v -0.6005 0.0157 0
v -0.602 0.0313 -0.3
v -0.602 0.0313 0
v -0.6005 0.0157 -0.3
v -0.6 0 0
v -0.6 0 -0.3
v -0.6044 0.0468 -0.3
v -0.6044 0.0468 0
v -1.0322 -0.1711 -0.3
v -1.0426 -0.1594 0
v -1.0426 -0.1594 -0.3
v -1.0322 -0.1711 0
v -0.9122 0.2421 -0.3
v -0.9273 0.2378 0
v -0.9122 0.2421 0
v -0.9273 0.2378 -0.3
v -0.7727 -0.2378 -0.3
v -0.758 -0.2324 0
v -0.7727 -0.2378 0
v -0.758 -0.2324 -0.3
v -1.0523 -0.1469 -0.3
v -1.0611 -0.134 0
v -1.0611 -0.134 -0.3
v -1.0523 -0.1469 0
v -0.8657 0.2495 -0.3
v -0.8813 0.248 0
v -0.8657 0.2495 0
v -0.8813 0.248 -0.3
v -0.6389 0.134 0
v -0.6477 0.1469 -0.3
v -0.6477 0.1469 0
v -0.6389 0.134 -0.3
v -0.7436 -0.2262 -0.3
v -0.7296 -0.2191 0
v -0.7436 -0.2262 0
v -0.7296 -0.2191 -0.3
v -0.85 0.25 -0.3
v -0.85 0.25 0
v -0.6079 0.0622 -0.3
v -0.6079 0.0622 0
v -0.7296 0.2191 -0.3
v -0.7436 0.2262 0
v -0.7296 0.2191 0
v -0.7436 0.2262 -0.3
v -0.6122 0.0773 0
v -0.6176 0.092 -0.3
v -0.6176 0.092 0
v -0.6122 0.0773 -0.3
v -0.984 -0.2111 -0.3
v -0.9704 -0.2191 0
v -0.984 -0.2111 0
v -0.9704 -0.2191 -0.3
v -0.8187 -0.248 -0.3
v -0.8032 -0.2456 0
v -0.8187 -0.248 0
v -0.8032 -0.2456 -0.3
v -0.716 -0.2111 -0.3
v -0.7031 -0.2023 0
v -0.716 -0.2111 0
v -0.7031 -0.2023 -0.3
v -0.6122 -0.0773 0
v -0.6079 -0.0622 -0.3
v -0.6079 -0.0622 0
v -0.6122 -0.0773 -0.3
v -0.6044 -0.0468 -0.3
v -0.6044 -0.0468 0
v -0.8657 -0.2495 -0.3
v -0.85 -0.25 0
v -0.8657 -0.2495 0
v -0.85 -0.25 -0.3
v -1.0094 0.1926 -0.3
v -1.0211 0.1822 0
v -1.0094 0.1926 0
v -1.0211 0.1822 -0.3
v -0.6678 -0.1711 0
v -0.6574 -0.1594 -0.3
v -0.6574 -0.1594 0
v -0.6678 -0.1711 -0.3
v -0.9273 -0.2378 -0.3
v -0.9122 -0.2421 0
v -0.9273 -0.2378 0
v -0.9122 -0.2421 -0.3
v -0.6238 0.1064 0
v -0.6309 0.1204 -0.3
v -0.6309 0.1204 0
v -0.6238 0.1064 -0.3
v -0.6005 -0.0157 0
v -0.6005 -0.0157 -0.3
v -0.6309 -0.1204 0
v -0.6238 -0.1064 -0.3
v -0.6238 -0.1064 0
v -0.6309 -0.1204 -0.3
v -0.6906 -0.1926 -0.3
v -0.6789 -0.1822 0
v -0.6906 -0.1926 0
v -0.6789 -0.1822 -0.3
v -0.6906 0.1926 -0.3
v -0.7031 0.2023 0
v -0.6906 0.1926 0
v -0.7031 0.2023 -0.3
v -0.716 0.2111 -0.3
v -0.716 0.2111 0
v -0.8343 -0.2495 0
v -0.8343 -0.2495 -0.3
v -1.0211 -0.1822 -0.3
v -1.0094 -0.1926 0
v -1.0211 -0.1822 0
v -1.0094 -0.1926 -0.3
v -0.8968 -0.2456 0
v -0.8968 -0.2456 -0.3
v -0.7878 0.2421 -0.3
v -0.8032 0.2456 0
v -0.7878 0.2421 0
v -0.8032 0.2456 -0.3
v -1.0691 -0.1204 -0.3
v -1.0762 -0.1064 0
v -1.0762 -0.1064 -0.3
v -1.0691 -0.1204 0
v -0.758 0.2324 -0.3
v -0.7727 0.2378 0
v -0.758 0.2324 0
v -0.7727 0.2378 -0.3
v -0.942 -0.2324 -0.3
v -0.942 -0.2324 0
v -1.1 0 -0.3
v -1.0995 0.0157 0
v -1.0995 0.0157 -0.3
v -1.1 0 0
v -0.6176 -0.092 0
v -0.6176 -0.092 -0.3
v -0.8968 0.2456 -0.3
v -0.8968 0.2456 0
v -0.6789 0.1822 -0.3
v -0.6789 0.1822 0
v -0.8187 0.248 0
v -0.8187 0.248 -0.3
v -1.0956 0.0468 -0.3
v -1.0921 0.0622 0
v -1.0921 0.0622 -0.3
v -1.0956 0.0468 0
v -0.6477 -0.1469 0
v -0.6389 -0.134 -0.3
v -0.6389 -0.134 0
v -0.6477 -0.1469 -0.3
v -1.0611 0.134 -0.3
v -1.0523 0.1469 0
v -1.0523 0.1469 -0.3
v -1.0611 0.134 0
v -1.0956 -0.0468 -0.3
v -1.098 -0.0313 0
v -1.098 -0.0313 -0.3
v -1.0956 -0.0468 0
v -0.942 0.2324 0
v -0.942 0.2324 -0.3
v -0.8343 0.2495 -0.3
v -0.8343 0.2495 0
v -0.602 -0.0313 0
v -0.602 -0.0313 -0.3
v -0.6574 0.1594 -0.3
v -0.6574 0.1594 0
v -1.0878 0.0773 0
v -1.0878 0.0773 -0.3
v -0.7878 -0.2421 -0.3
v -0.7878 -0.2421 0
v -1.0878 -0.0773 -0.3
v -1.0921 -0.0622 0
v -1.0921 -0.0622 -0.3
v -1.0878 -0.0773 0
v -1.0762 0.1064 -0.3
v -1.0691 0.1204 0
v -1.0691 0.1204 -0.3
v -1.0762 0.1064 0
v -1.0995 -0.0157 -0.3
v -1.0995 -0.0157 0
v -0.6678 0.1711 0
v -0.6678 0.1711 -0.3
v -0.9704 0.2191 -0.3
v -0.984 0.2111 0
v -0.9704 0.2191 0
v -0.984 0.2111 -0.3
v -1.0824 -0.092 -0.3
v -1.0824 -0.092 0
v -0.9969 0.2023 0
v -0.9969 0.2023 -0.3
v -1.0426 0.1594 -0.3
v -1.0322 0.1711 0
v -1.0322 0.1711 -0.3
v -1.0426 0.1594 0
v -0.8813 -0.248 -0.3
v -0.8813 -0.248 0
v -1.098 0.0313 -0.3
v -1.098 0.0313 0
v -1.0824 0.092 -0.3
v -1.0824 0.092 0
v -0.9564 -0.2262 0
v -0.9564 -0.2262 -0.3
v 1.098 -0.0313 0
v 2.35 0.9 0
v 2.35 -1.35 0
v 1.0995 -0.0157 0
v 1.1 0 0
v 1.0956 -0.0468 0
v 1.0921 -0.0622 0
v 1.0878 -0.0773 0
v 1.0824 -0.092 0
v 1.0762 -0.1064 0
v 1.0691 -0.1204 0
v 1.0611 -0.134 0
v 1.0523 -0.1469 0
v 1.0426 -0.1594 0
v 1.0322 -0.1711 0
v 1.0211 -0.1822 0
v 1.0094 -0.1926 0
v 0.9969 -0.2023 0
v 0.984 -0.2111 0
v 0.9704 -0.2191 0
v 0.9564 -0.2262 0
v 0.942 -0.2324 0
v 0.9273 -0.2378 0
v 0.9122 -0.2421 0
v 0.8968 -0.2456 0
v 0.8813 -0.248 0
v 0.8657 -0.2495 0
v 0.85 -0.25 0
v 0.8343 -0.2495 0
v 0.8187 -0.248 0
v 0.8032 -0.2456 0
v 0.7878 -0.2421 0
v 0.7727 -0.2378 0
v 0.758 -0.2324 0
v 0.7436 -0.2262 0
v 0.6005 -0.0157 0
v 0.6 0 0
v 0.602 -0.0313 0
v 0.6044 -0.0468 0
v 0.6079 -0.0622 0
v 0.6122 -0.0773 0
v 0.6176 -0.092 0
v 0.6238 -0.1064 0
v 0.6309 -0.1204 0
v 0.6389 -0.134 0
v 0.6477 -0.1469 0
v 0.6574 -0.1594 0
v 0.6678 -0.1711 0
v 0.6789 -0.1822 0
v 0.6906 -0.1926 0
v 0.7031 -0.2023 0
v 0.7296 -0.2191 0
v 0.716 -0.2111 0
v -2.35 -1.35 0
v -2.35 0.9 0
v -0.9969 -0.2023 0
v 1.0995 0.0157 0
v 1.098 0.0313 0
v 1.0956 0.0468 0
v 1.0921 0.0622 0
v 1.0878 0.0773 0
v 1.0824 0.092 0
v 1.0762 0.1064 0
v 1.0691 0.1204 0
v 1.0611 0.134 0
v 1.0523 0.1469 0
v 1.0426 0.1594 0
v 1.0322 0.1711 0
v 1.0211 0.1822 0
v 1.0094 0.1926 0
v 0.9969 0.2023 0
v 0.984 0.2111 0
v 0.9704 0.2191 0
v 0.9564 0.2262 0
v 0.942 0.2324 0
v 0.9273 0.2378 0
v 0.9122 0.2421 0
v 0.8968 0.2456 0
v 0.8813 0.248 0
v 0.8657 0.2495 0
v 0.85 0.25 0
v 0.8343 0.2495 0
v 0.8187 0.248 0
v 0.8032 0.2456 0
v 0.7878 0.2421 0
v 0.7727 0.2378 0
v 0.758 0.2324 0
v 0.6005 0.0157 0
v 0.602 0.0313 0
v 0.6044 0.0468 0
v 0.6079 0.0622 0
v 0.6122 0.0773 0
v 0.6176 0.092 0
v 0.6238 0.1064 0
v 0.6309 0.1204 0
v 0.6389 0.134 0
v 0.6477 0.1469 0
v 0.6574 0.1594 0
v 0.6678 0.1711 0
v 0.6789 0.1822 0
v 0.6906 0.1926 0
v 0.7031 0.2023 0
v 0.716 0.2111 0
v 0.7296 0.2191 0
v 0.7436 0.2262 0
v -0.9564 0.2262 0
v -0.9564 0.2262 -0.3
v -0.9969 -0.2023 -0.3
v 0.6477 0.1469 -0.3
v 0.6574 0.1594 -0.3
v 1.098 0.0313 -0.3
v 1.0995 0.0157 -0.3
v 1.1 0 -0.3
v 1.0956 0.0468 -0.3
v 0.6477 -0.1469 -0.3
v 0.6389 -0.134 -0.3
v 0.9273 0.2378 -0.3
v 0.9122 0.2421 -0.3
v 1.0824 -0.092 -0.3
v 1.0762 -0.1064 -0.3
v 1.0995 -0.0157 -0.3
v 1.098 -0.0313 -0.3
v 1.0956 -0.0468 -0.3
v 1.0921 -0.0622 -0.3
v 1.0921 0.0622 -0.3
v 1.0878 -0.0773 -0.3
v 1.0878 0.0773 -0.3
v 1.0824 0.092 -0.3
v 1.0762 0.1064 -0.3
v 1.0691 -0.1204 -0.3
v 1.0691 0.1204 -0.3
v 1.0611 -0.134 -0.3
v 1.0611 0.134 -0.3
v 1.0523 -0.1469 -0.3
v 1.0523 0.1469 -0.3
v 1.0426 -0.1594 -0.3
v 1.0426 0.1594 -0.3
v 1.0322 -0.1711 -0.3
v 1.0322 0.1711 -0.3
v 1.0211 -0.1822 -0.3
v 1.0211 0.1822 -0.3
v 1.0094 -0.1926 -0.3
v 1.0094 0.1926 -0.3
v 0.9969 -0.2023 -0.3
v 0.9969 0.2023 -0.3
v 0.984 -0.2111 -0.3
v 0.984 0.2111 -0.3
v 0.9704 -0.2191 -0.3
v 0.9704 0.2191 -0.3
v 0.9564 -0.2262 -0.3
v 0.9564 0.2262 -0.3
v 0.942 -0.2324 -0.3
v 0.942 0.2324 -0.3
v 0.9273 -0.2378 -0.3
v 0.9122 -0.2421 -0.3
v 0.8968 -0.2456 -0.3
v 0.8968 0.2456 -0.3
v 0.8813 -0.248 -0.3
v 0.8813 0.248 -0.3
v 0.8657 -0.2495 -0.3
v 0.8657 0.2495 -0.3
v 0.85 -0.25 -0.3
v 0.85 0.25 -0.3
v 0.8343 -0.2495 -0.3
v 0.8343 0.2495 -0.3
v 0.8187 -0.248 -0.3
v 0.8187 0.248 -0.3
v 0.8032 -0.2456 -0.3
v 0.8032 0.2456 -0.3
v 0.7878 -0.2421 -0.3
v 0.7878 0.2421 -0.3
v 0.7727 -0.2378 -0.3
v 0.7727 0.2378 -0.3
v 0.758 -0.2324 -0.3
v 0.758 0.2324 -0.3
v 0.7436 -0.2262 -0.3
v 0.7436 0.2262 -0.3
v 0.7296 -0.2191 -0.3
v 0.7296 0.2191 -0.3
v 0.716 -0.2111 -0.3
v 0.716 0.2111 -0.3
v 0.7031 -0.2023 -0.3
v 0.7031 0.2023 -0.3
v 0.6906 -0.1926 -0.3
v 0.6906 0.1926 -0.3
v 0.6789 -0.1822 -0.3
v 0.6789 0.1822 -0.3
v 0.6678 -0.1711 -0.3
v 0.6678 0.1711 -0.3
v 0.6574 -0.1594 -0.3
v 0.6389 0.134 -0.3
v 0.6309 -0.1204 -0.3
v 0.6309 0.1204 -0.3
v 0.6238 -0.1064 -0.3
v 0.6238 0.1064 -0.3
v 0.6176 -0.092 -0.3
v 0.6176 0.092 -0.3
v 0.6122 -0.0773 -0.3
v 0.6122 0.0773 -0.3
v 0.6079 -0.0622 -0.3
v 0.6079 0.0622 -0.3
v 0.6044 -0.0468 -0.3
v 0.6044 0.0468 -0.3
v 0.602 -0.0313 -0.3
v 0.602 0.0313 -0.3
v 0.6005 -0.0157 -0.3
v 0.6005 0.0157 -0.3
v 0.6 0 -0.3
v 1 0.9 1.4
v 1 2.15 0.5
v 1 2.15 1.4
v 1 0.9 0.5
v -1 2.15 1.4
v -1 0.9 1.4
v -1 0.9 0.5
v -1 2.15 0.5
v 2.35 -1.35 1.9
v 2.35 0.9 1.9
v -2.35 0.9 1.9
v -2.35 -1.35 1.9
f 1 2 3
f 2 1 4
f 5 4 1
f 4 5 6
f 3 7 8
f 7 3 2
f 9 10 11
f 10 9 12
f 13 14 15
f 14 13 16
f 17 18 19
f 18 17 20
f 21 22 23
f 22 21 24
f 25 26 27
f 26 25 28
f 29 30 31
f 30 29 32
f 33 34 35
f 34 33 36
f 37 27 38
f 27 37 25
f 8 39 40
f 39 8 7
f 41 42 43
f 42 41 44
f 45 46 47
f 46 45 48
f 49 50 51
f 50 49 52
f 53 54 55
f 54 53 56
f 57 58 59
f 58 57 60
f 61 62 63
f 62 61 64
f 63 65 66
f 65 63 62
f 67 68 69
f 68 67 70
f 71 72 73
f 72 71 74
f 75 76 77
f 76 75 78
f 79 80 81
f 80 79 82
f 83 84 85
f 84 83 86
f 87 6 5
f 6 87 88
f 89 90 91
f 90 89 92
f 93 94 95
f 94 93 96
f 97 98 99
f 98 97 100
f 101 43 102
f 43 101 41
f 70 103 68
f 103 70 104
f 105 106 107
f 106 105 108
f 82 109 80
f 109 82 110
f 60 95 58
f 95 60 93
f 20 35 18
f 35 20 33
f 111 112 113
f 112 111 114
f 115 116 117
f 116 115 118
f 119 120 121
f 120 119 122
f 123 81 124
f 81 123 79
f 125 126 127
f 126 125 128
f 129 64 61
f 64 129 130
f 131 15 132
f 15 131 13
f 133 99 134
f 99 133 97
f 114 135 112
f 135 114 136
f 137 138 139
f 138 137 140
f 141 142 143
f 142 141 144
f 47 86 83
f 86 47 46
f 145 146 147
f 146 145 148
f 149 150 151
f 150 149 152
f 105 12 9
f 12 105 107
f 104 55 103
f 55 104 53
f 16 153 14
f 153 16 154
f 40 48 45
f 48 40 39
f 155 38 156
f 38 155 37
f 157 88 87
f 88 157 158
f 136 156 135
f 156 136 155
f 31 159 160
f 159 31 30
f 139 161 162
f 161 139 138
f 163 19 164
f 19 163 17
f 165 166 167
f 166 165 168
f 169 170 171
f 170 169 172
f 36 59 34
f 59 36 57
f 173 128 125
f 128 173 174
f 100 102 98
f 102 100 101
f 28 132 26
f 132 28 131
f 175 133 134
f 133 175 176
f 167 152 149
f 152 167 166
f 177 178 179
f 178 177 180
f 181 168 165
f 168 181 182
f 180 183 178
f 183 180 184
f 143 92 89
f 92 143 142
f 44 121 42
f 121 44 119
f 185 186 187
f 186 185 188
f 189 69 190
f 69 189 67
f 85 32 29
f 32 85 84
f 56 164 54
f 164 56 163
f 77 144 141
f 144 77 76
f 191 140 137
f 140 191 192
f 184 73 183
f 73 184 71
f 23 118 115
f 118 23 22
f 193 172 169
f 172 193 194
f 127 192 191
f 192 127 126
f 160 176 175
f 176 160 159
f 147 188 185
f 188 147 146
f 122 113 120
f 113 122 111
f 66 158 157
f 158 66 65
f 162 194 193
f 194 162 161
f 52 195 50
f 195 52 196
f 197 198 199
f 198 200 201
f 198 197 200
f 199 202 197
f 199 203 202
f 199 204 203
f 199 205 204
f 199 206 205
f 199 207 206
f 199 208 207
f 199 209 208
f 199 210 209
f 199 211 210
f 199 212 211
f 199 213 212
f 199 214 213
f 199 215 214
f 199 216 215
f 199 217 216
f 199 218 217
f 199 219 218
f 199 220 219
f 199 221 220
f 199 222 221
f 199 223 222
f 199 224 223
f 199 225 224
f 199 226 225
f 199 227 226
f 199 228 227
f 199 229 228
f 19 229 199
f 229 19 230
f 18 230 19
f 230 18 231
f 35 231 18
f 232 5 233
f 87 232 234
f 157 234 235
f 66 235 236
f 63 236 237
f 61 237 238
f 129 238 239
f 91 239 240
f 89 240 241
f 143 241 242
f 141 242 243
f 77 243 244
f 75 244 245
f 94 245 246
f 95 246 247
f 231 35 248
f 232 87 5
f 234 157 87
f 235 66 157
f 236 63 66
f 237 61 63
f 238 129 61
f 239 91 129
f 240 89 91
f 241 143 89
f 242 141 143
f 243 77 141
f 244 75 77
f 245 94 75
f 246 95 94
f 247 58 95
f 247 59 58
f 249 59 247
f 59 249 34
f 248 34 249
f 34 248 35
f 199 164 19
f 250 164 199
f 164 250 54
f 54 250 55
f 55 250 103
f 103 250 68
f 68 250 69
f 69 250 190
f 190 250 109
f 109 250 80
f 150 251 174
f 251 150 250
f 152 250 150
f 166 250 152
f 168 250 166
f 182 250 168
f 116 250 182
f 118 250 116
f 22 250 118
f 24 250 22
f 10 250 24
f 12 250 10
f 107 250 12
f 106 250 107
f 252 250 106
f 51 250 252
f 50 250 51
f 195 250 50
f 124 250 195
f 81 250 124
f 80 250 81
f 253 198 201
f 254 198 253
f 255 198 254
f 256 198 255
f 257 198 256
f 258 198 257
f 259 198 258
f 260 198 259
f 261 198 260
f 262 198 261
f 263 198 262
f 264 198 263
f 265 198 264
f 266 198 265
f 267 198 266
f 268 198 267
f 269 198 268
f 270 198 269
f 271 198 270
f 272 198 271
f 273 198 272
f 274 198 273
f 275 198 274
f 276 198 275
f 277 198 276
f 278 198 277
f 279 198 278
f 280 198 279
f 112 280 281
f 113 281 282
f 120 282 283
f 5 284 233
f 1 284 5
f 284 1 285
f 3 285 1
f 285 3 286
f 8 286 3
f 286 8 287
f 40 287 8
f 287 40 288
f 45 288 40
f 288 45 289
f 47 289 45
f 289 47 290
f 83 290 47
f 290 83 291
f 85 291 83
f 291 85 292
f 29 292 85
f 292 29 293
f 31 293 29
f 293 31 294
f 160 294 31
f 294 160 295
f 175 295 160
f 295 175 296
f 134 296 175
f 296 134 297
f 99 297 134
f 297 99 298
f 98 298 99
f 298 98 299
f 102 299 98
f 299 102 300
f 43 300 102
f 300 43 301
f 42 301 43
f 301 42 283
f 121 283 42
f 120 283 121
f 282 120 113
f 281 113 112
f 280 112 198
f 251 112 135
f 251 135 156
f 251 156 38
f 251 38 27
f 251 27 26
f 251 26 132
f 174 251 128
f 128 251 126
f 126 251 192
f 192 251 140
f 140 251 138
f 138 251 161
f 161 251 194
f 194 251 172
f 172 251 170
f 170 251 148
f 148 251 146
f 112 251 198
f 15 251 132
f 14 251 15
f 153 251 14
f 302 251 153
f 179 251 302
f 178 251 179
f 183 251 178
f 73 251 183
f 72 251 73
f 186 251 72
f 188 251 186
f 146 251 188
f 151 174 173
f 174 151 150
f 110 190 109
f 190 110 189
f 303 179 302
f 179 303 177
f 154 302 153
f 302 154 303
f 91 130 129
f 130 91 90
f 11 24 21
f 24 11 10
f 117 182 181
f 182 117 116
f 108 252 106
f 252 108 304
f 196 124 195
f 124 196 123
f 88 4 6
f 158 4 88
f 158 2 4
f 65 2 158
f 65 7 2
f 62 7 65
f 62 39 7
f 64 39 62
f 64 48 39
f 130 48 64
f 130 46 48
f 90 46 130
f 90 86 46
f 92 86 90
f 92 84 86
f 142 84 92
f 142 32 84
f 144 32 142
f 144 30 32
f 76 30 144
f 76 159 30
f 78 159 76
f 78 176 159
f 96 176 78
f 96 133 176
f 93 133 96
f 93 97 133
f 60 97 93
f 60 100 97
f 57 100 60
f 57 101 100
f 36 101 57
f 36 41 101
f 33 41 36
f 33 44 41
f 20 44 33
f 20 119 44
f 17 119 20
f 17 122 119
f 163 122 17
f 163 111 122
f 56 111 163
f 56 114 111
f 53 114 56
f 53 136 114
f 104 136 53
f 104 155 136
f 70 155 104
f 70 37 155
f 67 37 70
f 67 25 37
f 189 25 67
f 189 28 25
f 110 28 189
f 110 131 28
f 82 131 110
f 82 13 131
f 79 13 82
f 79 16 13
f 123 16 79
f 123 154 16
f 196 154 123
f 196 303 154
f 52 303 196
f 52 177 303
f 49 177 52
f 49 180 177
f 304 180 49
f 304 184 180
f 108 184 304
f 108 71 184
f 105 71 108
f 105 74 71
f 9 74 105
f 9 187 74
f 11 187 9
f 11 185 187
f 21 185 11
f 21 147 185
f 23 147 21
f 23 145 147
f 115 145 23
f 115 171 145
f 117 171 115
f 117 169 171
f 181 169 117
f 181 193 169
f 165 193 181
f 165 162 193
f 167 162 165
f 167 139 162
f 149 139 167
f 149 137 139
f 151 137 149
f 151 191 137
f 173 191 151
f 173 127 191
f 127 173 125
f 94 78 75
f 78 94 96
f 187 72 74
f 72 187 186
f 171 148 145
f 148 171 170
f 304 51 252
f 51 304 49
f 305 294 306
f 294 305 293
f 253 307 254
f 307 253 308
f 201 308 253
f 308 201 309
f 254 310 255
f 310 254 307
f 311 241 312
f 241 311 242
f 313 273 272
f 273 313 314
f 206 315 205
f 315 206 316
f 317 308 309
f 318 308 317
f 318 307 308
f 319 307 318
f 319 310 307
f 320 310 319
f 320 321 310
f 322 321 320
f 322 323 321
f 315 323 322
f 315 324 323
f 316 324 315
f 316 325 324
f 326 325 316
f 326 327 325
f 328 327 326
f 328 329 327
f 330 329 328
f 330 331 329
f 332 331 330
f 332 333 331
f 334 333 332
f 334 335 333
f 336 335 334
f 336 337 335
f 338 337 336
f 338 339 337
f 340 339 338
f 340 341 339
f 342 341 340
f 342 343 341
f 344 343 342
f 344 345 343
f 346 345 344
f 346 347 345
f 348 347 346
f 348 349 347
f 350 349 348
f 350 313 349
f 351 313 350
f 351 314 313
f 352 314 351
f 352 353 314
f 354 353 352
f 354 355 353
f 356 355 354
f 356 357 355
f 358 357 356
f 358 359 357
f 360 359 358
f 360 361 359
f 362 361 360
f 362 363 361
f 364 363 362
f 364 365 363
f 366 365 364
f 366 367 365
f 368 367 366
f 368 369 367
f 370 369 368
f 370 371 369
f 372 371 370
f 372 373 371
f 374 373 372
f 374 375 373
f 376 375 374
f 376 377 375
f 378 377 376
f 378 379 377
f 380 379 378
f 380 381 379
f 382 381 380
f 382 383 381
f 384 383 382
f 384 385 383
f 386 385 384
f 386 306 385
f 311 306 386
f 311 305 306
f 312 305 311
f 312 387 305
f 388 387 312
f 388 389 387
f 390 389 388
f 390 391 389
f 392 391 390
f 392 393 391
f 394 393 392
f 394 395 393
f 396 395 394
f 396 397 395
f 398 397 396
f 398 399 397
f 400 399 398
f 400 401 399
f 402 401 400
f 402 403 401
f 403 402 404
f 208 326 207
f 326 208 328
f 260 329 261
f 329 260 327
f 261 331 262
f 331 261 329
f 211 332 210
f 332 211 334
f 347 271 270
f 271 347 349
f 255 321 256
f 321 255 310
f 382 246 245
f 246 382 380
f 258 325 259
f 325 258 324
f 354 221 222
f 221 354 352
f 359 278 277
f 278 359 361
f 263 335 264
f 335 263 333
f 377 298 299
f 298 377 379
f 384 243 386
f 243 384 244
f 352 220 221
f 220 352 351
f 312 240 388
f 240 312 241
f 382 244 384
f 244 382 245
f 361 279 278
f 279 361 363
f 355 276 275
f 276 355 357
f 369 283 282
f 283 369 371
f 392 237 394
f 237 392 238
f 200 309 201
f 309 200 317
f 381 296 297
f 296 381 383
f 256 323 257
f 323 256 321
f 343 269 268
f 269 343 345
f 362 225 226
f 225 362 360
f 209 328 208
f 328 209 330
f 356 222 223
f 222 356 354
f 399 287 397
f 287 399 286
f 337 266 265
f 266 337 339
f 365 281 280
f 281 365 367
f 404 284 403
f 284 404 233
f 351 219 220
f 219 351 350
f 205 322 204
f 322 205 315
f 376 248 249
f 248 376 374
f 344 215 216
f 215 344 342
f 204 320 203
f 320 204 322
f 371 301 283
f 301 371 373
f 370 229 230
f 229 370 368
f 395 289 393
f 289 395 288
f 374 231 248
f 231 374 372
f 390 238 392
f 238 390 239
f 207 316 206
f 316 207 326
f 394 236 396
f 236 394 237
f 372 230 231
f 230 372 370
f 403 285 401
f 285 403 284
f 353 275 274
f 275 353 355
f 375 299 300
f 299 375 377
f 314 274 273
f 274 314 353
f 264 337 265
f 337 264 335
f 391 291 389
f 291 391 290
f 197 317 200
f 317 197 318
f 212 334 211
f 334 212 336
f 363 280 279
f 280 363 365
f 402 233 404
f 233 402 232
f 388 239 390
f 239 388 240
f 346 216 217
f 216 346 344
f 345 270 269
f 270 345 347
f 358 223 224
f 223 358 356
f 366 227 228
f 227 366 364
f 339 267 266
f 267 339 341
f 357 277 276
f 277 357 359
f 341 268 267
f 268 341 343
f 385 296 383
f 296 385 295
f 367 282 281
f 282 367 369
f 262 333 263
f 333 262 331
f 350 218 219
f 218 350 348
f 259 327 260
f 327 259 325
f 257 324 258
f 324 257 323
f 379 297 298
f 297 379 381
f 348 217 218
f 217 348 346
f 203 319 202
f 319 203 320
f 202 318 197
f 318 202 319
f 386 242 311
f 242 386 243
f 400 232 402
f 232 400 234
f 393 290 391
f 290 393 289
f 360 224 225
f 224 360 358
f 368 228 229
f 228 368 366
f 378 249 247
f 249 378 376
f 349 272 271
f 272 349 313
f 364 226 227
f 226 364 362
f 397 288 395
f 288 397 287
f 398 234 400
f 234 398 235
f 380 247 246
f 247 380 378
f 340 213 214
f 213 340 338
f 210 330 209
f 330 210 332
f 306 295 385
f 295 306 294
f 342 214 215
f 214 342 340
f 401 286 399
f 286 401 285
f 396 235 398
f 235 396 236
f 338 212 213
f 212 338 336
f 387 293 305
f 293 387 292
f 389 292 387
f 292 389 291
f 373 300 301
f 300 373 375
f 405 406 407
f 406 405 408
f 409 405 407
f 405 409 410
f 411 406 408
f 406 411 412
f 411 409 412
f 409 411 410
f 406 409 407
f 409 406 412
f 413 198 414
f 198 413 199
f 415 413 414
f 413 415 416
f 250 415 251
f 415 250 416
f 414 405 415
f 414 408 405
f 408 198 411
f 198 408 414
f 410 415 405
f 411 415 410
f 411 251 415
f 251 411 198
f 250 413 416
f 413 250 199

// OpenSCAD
// file: roundedcube.scad
// Higher definition curves
$fs = 0.01;

module roundedcube(size = [1, 1, 1], center = false, radius = 0.5, apply_to = "all") {
	// If single value, convert to [x, y, z] vector
	size = (size[0] == undef) ? [size, size, size] : size;

	translate_min = radius;
	translate_xmax = size[0] - radius;
	translate_ymax = size[1] - radius;
	translate_zmax = size[2] - radius;

	diameter = radius * 2;

	module build_point(type = "sphere", rotate = [0, 0, 0]) {
		if (type == "sphere") {
			sphere(r = radius);
		} else if (type == "cylinder") {
			rotate(a = rotate)
			cylinder(h = diameter, r = radius, center = true);
		}
	}

	obj_translate = (center == false) ?
		[0, 0, 0] : [
			-(size[0] / 2),
			-(size[1] / 2),
			-(size[2] / 2)
		];

	translate(v = obj_translate) {
		hull() {
			for (translate_x = [translate_min, translate_xmax]) {
				x_at = (translate_x == translate_min) ? "min" : "max";
				for (translate_y = [translate_min, translate_ymax]) {
					y_at = (translate_y == translate_min) ? "min" : "max";
					for (translate_z = [translate_min, translate_zmax]) {
						z_at = (translate_z == translate_min) ? "min" : "max";

						translate(v = [translate_x, translate_y, translate_z])
						if (
							(apply_to == "all") ||
							(apply_to == "xmin" && x_at == "min") || (apply_to == "xmax" && x_at == "max") ||
							(apply_to == "ymin" && y_at == "min") || (apply_to == "ymax" && y_at == "max") ||
							(apply_to == "zmin" && z_at == "min") || (apply_to == "zmax" && z_at == "max")
						) {
							build_point("sphere");
						} else {
							rotate =
								(apply_to == "xmin" || apply_to == "xmax" || apply_to == "x") ? [0, 90, 0] : (
								(apply_to == "ymin" || apply_to == "ymax" || apply_to == "y") ? [90, 90, 0] :
								[0, 0, 0]
							);
							build_point("cylinder", rotate);
						}
					}
				}
			}
		}
	}
}

module roundedcubez(size = [1, 1, 1], center = false, radius = 0.5, apply_to = "all") {
	intersection() {
		roundedcube(size, center, radius, apply_to="z");
		scale([1.0, 1.0, 1.1])
			cube(size, center);
	}
}

// The good stuff!!!!  Forget about the whack stuff above.
// centered on XY only
module cube_(size=[1, 1, 1])
	translate([-size[0] / 2, -size[1] / 2, 0])
		cube(size);

// centered on XY only
module roundedcubez_(size = [1, 1, 1], radius = 0.5) {
	linear_extrude(height=size[2]) {
		square([size[0] - 2 * radius, size[1]], center=true);
		square([size[0], size[1] - 2 * radius], center=true);
		for (i=[-1, 1])
			for (j=[-1, 1])
				translate([i * (size[0] / 2 - radius), j * (size[1] / 2 - radius), 0])
					circle(r = radius);
	}
}
// main file
$fn = $preview ? 30 : 100;
include <roundedcube.scad>


translate([0, 2.15 / 2, 1.9 / 2 - 0.9 / 2])
	cube_(size=[2, 2.15, 0.9]);
translate([0, 2.25 / 2 + 2.15 - 3.5, 0])
	cube_(size=[4.7, 2.25, 1.9]);

color("yellow")
	for (i=[-1, 1])
		translate([i * 1.7 / 2, 0, -0.3])
			cylinder(h=0.3, d=0.5);
